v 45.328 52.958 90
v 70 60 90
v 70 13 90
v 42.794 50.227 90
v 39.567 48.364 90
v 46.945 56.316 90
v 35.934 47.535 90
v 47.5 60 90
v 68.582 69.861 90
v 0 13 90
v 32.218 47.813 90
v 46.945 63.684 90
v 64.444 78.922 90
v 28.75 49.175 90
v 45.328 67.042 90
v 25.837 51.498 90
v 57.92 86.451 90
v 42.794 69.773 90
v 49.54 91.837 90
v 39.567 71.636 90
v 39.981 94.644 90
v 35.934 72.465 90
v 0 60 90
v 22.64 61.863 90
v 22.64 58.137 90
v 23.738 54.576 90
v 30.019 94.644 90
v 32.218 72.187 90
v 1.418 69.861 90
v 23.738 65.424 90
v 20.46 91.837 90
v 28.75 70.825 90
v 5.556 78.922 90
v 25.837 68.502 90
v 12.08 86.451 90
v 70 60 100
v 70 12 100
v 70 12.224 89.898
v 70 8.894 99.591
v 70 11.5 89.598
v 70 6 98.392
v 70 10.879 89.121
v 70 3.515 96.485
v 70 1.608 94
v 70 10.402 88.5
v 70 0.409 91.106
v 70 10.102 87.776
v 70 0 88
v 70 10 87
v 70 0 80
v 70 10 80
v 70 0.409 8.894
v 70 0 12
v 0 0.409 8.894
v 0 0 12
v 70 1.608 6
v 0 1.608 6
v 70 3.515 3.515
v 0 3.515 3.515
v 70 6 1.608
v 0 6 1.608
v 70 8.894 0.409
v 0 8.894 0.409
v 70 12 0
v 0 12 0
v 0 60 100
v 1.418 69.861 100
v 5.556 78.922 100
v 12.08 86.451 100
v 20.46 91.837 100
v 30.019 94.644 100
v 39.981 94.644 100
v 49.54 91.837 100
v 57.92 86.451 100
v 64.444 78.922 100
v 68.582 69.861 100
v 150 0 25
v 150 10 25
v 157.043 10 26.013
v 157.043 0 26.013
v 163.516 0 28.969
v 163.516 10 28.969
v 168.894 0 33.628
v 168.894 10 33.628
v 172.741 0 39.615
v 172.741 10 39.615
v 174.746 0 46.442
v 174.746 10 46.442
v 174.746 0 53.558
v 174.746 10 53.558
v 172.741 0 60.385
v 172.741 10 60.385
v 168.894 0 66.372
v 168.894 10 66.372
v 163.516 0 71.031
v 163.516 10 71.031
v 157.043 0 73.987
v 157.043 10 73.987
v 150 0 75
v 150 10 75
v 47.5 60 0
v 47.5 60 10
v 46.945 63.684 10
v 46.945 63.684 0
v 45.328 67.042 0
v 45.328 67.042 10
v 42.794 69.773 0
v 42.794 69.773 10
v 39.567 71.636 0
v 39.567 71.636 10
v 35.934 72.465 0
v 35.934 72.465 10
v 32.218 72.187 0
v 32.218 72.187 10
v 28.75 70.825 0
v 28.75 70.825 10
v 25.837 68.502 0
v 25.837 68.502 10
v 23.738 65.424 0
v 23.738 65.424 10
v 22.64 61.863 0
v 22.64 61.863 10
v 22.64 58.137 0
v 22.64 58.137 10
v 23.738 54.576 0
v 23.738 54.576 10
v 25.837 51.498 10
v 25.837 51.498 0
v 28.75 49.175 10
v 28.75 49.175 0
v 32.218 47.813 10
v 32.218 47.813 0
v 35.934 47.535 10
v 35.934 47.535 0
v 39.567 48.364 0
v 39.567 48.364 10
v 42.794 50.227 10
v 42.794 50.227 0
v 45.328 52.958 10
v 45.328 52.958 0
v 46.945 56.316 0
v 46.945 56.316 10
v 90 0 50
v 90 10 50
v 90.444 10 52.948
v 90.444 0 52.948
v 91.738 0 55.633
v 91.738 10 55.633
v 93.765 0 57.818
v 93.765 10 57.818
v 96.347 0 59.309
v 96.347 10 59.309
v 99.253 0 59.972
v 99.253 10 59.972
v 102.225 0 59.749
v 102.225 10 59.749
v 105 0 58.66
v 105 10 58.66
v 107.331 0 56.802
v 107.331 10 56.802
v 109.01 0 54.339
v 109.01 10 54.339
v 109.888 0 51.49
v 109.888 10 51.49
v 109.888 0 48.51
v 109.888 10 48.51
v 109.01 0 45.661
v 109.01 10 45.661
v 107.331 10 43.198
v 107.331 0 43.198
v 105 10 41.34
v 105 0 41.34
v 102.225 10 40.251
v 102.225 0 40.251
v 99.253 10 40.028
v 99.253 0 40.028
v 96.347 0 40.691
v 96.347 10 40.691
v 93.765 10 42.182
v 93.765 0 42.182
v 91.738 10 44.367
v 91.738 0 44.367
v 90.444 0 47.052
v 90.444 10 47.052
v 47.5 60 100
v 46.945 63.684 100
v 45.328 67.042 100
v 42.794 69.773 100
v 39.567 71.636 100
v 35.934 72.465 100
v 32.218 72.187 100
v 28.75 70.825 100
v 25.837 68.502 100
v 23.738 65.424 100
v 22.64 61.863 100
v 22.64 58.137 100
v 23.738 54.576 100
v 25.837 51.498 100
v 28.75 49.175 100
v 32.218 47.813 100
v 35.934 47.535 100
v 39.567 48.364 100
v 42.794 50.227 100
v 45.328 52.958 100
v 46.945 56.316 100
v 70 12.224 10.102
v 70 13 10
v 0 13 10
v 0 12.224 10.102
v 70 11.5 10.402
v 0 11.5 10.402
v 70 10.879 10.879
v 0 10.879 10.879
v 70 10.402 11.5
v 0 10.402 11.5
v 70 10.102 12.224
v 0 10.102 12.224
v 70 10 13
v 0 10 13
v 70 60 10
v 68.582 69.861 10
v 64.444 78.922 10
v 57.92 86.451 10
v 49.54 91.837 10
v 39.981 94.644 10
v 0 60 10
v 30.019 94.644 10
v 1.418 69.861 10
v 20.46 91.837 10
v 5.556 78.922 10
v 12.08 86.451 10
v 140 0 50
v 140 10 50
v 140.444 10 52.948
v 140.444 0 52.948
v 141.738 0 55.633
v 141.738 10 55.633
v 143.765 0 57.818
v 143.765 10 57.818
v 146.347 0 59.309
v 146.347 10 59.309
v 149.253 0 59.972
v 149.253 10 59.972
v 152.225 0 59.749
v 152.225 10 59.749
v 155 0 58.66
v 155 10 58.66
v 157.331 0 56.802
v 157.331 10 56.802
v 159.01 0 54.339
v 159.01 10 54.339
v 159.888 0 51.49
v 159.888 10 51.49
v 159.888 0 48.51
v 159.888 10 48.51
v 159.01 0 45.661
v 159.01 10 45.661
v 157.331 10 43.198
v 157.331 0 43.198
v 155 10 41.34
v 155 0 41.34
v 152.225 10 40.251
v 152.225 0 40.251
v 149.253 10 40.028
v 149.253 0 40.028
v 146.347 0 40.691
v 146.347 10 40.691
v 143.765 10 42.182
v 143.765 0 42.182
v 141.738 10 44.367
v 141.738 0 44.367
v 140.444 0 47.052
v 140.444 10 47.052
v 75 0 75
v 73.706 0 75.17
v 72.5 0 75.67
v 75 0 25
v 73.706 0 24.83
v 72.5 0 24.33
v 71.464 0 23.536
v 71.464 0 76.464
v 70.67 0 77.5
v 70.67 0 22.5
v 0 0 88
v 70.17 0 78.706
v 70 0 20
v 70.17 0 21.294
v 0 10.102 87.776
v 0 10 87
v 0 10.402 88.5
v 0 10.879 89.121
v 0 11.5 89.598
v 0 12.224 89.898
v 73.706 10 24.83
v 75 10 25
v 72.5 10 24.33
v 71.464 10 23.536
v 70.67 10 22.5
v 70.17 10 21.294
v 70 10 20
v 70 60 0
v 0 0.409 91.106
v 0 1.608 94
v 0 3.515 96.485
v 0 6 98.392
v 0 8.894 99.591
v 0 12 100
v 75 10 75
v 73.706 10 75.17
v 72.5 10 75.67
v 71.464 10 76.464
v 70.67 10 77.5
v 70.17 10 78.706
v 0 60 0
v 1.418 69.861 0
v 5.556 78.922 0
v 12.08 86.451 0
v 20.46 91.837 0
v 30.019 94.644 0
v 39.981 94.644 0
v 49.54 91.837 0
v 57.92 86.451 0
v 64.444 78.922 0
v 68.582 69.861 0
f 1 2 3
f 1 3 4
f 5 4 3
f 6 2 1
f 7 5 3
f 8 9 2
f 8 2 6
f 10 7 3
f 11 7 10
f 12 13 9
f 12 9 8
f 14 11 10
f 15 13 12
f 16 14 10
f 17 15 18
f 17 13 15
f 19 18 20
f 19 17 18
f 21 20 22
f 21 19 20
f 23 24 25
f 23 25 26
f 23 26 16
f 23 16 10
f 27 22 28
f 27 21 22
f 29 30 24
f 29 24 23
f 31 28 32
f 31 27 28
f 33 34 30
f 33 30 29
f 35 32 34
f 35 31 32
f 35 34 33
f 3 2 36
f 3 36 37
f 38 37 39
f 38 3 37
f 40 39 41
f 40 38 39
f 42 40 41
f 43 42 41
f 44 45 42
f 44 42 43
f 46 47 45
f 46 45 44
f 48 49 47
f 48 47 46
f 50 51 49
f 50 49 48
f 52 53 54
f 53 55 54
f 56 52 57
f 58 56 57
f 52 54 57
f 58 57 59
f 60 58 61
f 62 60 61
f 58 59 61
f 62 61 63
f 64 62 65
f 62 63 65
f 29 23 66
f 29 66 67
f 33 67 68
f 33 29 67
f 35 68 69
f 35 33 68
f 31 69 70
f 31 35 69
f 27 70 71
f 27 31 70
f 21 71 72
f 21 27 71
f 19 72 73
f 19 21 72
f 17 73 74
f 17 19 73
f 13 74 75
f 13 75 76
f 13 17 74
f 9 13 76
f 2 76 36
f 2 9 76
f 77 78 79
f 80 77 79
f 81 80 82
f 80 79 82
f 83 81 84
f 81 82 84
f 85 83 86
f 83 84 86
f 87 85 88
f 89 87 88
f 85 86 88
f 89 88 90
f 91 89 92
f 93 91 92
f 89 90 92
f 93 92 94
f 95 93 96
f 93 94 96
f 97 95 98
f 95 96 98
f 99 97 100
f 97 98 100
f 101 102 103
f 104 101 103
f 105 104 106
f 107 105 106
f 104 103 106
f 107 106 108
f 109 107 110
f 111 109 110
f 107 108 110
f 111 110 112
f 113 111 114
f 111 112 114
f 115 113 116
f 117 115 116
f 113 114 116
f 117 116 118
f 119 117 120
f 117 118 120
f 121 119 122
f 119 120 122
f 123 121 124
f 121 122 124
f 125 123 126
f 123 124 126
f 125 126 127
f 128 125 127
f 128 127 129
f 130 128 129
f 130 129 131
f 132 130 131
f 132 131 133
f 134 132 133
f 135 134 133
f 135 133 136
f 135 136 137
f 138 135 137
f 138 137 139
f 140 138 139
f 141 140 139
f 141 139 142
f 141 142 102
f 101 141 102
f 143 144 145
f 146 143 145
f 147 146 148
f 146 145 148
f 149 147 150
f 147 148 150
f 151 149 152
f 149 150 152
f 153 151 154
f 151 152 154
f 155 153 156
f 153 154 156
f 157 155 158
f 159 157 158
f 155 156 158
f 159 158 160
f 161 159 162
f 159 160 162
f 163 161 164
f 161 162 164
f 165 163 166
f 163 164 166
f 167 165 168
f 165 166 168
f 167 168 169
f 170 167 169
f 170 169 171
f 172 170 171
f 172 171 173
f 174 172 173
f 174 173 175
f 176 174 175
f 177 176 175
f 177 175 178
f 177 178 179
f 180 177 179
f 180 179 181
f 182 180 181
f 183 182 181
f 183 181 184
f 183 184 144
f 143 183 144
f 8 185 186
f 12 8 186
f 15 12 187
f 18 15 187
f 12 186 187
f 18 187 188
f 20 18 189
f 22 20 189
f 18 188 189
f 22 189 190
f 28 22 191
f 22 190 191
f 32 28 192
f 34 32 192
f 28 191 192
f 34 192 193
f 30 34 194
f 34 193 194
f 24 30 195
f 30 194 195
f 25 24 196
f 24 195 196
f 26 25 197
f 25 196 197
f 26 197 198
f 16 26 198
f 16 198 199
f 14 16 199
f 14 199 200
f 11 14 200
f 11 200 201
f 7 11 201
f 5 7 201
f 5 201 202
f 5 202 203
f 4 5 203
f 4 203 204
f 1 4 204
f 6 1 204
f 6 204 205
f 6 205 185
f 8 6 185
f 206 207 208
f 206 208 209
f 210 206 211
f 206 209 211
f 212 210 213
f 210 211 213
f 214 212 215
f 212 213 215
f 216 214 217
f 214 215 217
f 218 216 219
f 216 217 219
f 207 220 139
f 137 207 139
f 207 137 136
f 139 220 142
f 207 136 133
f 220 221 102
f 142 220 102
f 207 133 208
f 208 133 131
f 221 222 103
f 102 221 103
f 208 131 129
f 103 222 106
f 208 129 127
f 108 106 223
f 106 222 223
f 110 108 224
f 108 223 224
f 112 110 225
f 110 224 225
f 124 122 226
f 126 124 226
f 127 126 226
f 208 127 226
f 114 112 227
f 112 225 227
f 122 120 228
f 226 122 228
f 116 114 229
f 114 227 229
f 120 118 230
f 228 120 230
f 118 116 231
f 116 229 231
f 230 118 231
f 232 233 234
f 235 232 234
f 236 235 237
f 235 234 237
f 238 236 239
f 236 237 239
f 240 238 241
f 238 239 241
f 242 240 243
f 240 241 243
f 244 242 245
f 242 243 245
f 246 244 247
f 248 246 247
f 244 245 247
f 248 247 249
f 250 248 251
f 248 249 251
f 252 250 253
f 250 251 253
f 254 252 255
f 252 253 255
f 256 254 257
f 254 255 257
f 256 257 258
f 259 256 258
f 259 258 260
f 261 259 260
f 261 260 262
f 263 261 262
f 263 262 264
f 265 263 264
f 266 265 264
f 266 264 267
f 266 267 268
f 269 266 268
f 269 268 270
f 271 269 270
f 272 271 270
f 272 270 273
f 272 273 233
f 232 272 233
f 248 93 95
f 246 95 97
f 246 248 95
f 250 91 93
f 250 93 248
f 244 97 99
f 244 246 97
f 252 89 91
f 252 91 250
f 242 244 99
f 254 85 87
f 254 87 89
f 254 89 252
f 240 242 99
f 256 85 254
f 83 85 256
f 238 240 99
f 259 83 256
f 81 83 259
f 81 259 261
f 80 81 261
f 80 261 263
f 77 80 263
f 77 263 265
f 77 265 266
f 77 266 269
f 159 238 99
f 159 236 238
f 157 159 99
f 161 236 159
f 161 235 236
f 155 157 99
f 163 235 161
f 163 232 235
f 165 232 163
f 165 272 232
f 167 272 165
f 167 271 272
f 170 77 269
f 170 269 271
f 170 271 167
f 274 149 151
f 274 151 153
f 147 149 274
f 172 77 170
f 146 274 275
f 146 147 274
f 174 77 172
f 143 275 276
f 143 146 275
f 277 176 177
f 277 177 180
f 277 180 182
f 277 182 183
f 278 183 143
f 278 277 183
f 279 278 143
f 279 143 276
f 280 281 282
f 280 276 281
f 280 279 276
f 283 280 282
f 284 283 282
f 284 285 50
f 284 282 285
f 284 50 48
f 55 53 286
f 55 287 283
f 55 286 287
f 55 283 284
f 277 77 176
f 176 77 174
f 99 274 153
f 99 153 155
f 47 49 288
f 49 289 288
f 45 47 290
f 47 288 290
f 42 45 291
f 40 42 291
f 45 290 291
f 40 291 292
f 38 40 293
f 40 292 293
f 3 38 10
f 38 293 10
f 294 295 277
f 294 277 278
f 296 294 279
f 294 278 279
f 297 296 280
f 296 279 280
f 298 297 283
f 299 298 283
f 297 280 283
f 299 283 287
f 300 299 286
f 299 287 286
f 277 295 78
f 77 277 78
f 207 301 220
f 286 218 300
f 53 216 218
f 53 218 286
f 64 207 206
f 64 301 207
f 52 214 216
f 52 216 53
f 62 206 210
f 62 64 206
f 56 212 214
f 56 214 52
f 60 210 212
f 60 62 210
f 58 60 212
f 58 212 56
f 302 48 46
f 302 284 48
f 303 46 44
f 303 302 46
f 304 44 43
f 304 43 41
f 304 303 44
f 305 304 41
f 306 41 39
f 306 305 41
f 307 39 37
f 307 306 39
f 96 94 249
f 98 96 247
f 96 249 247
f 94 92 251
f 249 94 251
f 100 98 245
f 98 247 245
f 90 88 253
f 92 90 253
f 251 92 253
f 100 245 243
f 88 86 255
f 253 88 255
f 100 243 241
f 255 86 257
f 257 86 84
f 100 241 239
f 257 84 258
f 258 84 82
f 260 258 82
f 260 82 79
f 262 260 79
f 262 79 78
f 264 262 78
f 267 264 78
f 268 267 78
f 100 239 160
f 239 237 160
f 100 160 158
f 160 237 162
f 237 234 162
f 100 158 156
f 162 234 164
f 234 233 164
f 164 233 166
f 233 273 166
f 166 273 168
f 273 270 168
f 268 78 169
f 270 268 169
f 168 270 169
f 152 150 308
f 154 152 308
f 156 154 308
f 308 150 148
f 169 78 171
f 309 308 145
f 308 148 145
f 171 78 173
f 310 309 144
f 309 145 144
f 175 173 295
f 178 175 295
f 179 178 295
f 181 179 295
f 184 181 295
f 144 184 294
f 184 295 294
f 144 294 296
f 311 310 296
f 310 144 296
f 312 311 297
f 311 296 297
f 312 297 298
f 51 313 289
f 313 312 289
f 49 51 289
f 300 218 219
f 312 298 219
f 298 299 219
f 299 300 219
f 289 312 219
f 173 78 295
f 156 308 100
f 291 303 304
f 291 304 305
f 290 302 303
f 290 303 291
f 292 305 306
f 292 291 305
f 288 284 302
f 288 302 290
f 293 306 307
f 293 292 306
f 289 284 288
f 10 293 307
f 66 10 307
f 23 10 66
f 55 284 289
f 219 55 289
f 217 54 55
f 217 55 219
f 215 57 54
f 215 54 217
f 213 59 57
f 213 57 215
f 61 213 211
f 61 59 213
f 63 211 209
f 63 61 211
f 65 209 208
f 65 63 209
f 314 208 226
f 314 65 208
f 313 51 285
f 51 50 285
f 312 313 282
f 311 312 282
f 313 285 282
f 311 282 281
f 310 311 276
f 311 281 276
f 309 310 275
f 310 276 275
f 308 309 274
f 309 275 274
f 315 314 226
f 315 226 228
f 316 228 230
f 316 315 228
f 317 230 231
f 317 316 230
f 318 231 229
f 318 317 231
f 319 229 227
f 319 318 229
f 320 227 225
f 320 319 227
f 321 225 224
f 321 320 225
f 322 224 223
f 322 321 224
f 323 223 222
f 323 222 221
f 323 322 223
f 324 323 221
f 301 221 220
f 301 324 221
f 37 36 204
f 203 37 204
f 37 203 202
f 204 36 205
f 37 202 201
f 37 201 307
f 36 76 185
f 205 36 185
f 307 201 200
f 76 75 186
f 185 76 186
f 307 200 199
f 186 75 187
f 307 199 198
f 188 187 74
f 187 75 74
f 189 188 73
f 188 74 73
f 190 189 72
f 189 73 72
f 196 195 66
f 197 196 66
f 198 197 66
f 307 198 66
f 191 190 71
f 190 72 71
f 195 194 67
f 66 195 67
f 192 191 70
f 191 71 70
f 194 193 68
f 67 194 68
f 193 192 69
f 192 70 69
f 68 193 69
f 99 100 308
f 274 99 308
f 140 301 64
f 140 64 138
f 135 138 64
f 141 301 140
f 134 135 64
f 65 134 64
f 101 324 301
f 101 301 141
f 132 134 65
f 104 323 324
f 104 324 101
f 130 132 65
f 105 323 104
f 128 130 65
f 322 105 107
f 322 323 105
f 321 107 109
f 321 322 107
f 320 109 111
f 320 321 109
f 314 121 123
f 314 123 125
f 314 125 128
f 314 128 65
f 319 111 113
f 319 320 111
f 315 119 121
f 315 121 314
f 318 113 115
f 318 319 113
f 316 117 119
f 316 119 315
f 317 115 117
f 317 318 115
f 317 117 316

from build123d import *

# Parameters (mm, degrees)
BOSS_EXTRU_1_DEPTH      = 10
ESQUISSE4_W             = 70
ESQUISSE4_H             = 80
BOSS_EXTRU_2_DEPTH      = 10
BOSS_EXTRU_3_DEPTH      = 10
ESQUISSE7_R             = 12.5
ENL_V_MAT_EXTRU_2_DEPTH = 155.677082983
BOSS_EXTRU_4_DEPTH      = 10
ESQUISSE10_R            = 10
ENL_V_MAT_EXTRU_3_DEPTH = 219.746428542
CONG_1_R                = 5
CONG_5_R                = 12
CONG_6_R                = 12
CONG_7_R                = 3
CONG_8_R                = 3


with BuildPart() as part:
    # Esquisse1 → Boss.-Extru.1 (new body)
    with BuildSketch(Plane.XY):
        with BuildLine():
            Line((0, 0), (0, 60))
            ThreePointArc((0, 60), (35, 95), (70, 60))
            Line((70, 60), (70, 0))
            Line((70, 0), (0, 0))
        make_face()
    extrude(amount=BOSS_EXTRU_1_DEPTH)

    # Esquisse4 → Boss.-Extru.2 (add)
    with BuildSketch(Plane(origin=(0, 0, 0), x_dir=(-1, 0, 0), z_dir=(0, -1, 0))):
        with Locations((-35, -50)):
            Rectangle(ESQUISSE4_W, ESQUISSE4_H)
    extrude(amount=-BOSS_EXTRU_2_DEPTH)

    # Esquisse6 → Boss.-Extru.3 (add)
    with BuildSketch(Plane.XY.offset(90)):
        with BuildLine():
            Line((0, 0), (0, 60))
            ThreePointArc((0, 60), (35, 95), (70, 60))
            Line((70, 60), (70, 0))
            Line((70, 0), (0, 0))
        make_face()
    extrude(amount=BOSS_EXTRU_3_DEPTH)

    # Esquisse7 → Enlèv. mat.-Extru.2 (cut, through all)
    with BuildSketch(Plane.XY.offset(100)):
        with Locations((35, 60)):
            Circle(ESQUISSE7_R)
    extrude(amount=-ENL_V_MAT_EXTRU_2_DEPTH, mode=Mode.SUBTRACT)

    # Esquisse9 → Boss.-Extru.4 (add)
    with BuildSketch(Plane(origin=(0, 10, 0), x_dir=(1, 0, 0), z_dir=(0, 1, 0))):
        with BuildLine():
            Line((70, -25), (150, -25))
            ThreePointArc((150, -25), (175, -50), (150, -75))
            Line((150, -75), (70, -75))
            Line((70, -75), (70, -25))
        make_face()
    extrude(amount=-BOSS_EXTRU_4_DEPTH)

    # Esquisse10 → Enlèv. mat.-Extru.3 (cut, through all)
    with BuildSketch(Plane(origin=(0, 10, 0), x_dir=(1, 0, 0), z_dir=(0, 1, 0))):
        with Locations(Location((150, -50, 0), (0, 0, 180))):
            Circle(ESQUISSE10_R)
        with Locations(Location((100, -50, 0), (0, 0, 180))):
            Circle(ESQUISSE10_R)
    extrude(amount=-ENL_V_MAT_EXTRU_3_DEPTH, mode=Mode.SUBTRACT)

    # Congé1
    cong_1_edges = [part.edges().sort_by_distance(p)[0] for p in [
        (70, 5, 75),
        (70, 5, 25),
    ]]
    fillet(cong_1_edges, radius=CONG_1_R)

    # Congé5
    cong_5_edges = [part.edges().sort_by_distance(p)[0] for p in [
        (35, 0, 100),
    ]]
    fillet(cong_5_edges, radius=CONG_5_R)

    # Congé6
    cong_6_edges = [part.edges().sort_by_distance(p)[0] for p in [
        (35, 0, 0),
    ]]
    fillet(cong_6_edges, radius=CONG_6_R)

    # Congé7
    cong_7_edges = [part.edges().sort_by_distance(p)[0] for p in [
        (35, 10, 10),
    ]]
    fillet(cong_7_edges, radius=CONG_7_R)

    # Congé8
    cong_8_edges = [part.edges().sort_by_distance(p)[0] for p in [
        (35, 10, 90),
    ]]
    fillet(cong_8_edges, radius=CONG_8_R)


solid = part.part
